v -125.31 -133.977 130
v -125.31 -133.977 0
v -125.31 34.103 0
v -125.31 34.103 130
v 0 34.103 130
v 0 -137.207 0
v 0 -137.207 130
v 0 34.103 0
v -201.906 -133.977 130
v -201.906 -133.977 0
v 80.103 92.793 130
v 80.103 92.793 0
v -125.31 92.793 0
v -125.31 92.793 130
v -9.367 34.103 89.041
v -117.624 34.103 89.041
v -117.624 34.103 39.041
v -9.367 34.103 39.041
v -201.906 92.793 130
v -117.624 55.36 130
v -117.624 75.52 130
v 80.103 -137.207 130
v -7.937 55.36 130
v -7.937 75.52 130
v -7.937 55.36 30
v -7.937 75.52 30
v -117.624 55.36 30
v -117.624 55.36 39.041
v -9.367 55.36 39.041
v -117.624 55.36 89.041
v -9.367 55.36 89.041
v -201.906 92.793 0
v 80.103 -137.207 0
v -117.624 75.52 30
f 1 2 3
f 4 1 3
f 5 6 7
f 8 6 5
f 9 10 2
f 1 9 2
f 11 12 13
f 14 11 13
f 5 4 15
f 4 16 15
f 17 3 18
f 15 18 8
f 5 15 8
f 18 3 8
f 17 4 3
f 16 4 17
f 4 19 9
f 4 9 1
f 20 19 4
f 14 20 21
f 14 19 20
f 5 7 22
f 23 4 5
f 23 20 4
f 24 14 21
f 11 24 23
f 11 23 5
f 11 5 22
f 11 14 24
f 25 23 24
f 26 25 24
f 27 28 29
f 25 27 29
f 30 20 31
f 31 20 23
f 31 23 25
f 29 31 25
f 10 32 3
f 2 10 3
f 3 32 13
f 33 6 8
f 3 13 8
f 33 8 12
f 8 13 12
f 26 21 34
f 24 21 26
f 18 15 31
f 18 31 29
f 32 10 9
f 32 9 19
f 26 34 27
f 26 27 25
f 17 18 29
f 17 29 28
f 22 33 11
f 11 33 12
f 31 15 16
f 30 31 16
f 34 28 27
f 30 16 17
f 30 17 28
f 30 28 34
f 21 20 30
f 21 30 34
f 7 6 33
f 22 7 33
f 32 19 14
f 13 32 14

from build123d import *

# Parameters (mm, degrees)
SKETCH1_W           = 76.595992709
SKETCH1_H           = 226.770325479
SKETCH1_W_2         = 125.310344828
SKETCH1_H_2         = 58.689655172
SKETCH1_W_3         = 80.103448276
SKETCH1_H_3         = 230
BOSS_EXTRUDE1_DEPTH = 130
SKETCH3_W           = 109.68672873
SKETCH3_H           = 20.160489082
CUT_EXTRUDE1_DEPTH  = 100
SKETCH7_W           = 108.256911282
SKETCH7_H           = 50
CUT_EXTRUDE3_DEPTH  = 40


with BuildPart() as part:
    # Sketch1 → Boss-Extrude1 (new body)
    with BuildSketch(Plane.XY):
        with Locations((-163.608341182, -20.592059291)):
            Rectangle(SKETCH1_W, SKETCH1_H)
        with Locations((-62.655172414, 63.448275862)):
            Rectangle(SKETCH1_W_2, SKETCH1_H_2)
        with Locations((40.051724138, -22.206896552)):
            Rectangle(SKETCH1_W_3, SKETCH1_H_3)
    extrude(amount=BOSS_EXTRUDE1_DEPTH)

    # Sketch3 → Cut-Extrude1 (cut)
    with BuildSketch(Plane.XY.offset(130)):
        with Locations((-62.780812257, 65.439975471)):
            Rectangle(SKETCH3_W, SKETCH3_H)
    extrude(amount=-CUT_EXTRUDE1_DEPTH, mode=Mode.SUBTRACT)

    # Sketch7 → Cut-Extrude3 (cut)
    with BuildSketch(Plane(origin=(0, 34.103448276, 0), x_dir=(-1, 0, 0), z_dir=(0, -1, 0))):
        with Locations((63.495720981, -64.04122146)):
            Rectangle(SKETCH7_W, SKETCH7_H)
    extrude(amount=-CUT_EXTRUDE3_DEPTH, mode=Mode.SUBTRACT)


solid = part.part
